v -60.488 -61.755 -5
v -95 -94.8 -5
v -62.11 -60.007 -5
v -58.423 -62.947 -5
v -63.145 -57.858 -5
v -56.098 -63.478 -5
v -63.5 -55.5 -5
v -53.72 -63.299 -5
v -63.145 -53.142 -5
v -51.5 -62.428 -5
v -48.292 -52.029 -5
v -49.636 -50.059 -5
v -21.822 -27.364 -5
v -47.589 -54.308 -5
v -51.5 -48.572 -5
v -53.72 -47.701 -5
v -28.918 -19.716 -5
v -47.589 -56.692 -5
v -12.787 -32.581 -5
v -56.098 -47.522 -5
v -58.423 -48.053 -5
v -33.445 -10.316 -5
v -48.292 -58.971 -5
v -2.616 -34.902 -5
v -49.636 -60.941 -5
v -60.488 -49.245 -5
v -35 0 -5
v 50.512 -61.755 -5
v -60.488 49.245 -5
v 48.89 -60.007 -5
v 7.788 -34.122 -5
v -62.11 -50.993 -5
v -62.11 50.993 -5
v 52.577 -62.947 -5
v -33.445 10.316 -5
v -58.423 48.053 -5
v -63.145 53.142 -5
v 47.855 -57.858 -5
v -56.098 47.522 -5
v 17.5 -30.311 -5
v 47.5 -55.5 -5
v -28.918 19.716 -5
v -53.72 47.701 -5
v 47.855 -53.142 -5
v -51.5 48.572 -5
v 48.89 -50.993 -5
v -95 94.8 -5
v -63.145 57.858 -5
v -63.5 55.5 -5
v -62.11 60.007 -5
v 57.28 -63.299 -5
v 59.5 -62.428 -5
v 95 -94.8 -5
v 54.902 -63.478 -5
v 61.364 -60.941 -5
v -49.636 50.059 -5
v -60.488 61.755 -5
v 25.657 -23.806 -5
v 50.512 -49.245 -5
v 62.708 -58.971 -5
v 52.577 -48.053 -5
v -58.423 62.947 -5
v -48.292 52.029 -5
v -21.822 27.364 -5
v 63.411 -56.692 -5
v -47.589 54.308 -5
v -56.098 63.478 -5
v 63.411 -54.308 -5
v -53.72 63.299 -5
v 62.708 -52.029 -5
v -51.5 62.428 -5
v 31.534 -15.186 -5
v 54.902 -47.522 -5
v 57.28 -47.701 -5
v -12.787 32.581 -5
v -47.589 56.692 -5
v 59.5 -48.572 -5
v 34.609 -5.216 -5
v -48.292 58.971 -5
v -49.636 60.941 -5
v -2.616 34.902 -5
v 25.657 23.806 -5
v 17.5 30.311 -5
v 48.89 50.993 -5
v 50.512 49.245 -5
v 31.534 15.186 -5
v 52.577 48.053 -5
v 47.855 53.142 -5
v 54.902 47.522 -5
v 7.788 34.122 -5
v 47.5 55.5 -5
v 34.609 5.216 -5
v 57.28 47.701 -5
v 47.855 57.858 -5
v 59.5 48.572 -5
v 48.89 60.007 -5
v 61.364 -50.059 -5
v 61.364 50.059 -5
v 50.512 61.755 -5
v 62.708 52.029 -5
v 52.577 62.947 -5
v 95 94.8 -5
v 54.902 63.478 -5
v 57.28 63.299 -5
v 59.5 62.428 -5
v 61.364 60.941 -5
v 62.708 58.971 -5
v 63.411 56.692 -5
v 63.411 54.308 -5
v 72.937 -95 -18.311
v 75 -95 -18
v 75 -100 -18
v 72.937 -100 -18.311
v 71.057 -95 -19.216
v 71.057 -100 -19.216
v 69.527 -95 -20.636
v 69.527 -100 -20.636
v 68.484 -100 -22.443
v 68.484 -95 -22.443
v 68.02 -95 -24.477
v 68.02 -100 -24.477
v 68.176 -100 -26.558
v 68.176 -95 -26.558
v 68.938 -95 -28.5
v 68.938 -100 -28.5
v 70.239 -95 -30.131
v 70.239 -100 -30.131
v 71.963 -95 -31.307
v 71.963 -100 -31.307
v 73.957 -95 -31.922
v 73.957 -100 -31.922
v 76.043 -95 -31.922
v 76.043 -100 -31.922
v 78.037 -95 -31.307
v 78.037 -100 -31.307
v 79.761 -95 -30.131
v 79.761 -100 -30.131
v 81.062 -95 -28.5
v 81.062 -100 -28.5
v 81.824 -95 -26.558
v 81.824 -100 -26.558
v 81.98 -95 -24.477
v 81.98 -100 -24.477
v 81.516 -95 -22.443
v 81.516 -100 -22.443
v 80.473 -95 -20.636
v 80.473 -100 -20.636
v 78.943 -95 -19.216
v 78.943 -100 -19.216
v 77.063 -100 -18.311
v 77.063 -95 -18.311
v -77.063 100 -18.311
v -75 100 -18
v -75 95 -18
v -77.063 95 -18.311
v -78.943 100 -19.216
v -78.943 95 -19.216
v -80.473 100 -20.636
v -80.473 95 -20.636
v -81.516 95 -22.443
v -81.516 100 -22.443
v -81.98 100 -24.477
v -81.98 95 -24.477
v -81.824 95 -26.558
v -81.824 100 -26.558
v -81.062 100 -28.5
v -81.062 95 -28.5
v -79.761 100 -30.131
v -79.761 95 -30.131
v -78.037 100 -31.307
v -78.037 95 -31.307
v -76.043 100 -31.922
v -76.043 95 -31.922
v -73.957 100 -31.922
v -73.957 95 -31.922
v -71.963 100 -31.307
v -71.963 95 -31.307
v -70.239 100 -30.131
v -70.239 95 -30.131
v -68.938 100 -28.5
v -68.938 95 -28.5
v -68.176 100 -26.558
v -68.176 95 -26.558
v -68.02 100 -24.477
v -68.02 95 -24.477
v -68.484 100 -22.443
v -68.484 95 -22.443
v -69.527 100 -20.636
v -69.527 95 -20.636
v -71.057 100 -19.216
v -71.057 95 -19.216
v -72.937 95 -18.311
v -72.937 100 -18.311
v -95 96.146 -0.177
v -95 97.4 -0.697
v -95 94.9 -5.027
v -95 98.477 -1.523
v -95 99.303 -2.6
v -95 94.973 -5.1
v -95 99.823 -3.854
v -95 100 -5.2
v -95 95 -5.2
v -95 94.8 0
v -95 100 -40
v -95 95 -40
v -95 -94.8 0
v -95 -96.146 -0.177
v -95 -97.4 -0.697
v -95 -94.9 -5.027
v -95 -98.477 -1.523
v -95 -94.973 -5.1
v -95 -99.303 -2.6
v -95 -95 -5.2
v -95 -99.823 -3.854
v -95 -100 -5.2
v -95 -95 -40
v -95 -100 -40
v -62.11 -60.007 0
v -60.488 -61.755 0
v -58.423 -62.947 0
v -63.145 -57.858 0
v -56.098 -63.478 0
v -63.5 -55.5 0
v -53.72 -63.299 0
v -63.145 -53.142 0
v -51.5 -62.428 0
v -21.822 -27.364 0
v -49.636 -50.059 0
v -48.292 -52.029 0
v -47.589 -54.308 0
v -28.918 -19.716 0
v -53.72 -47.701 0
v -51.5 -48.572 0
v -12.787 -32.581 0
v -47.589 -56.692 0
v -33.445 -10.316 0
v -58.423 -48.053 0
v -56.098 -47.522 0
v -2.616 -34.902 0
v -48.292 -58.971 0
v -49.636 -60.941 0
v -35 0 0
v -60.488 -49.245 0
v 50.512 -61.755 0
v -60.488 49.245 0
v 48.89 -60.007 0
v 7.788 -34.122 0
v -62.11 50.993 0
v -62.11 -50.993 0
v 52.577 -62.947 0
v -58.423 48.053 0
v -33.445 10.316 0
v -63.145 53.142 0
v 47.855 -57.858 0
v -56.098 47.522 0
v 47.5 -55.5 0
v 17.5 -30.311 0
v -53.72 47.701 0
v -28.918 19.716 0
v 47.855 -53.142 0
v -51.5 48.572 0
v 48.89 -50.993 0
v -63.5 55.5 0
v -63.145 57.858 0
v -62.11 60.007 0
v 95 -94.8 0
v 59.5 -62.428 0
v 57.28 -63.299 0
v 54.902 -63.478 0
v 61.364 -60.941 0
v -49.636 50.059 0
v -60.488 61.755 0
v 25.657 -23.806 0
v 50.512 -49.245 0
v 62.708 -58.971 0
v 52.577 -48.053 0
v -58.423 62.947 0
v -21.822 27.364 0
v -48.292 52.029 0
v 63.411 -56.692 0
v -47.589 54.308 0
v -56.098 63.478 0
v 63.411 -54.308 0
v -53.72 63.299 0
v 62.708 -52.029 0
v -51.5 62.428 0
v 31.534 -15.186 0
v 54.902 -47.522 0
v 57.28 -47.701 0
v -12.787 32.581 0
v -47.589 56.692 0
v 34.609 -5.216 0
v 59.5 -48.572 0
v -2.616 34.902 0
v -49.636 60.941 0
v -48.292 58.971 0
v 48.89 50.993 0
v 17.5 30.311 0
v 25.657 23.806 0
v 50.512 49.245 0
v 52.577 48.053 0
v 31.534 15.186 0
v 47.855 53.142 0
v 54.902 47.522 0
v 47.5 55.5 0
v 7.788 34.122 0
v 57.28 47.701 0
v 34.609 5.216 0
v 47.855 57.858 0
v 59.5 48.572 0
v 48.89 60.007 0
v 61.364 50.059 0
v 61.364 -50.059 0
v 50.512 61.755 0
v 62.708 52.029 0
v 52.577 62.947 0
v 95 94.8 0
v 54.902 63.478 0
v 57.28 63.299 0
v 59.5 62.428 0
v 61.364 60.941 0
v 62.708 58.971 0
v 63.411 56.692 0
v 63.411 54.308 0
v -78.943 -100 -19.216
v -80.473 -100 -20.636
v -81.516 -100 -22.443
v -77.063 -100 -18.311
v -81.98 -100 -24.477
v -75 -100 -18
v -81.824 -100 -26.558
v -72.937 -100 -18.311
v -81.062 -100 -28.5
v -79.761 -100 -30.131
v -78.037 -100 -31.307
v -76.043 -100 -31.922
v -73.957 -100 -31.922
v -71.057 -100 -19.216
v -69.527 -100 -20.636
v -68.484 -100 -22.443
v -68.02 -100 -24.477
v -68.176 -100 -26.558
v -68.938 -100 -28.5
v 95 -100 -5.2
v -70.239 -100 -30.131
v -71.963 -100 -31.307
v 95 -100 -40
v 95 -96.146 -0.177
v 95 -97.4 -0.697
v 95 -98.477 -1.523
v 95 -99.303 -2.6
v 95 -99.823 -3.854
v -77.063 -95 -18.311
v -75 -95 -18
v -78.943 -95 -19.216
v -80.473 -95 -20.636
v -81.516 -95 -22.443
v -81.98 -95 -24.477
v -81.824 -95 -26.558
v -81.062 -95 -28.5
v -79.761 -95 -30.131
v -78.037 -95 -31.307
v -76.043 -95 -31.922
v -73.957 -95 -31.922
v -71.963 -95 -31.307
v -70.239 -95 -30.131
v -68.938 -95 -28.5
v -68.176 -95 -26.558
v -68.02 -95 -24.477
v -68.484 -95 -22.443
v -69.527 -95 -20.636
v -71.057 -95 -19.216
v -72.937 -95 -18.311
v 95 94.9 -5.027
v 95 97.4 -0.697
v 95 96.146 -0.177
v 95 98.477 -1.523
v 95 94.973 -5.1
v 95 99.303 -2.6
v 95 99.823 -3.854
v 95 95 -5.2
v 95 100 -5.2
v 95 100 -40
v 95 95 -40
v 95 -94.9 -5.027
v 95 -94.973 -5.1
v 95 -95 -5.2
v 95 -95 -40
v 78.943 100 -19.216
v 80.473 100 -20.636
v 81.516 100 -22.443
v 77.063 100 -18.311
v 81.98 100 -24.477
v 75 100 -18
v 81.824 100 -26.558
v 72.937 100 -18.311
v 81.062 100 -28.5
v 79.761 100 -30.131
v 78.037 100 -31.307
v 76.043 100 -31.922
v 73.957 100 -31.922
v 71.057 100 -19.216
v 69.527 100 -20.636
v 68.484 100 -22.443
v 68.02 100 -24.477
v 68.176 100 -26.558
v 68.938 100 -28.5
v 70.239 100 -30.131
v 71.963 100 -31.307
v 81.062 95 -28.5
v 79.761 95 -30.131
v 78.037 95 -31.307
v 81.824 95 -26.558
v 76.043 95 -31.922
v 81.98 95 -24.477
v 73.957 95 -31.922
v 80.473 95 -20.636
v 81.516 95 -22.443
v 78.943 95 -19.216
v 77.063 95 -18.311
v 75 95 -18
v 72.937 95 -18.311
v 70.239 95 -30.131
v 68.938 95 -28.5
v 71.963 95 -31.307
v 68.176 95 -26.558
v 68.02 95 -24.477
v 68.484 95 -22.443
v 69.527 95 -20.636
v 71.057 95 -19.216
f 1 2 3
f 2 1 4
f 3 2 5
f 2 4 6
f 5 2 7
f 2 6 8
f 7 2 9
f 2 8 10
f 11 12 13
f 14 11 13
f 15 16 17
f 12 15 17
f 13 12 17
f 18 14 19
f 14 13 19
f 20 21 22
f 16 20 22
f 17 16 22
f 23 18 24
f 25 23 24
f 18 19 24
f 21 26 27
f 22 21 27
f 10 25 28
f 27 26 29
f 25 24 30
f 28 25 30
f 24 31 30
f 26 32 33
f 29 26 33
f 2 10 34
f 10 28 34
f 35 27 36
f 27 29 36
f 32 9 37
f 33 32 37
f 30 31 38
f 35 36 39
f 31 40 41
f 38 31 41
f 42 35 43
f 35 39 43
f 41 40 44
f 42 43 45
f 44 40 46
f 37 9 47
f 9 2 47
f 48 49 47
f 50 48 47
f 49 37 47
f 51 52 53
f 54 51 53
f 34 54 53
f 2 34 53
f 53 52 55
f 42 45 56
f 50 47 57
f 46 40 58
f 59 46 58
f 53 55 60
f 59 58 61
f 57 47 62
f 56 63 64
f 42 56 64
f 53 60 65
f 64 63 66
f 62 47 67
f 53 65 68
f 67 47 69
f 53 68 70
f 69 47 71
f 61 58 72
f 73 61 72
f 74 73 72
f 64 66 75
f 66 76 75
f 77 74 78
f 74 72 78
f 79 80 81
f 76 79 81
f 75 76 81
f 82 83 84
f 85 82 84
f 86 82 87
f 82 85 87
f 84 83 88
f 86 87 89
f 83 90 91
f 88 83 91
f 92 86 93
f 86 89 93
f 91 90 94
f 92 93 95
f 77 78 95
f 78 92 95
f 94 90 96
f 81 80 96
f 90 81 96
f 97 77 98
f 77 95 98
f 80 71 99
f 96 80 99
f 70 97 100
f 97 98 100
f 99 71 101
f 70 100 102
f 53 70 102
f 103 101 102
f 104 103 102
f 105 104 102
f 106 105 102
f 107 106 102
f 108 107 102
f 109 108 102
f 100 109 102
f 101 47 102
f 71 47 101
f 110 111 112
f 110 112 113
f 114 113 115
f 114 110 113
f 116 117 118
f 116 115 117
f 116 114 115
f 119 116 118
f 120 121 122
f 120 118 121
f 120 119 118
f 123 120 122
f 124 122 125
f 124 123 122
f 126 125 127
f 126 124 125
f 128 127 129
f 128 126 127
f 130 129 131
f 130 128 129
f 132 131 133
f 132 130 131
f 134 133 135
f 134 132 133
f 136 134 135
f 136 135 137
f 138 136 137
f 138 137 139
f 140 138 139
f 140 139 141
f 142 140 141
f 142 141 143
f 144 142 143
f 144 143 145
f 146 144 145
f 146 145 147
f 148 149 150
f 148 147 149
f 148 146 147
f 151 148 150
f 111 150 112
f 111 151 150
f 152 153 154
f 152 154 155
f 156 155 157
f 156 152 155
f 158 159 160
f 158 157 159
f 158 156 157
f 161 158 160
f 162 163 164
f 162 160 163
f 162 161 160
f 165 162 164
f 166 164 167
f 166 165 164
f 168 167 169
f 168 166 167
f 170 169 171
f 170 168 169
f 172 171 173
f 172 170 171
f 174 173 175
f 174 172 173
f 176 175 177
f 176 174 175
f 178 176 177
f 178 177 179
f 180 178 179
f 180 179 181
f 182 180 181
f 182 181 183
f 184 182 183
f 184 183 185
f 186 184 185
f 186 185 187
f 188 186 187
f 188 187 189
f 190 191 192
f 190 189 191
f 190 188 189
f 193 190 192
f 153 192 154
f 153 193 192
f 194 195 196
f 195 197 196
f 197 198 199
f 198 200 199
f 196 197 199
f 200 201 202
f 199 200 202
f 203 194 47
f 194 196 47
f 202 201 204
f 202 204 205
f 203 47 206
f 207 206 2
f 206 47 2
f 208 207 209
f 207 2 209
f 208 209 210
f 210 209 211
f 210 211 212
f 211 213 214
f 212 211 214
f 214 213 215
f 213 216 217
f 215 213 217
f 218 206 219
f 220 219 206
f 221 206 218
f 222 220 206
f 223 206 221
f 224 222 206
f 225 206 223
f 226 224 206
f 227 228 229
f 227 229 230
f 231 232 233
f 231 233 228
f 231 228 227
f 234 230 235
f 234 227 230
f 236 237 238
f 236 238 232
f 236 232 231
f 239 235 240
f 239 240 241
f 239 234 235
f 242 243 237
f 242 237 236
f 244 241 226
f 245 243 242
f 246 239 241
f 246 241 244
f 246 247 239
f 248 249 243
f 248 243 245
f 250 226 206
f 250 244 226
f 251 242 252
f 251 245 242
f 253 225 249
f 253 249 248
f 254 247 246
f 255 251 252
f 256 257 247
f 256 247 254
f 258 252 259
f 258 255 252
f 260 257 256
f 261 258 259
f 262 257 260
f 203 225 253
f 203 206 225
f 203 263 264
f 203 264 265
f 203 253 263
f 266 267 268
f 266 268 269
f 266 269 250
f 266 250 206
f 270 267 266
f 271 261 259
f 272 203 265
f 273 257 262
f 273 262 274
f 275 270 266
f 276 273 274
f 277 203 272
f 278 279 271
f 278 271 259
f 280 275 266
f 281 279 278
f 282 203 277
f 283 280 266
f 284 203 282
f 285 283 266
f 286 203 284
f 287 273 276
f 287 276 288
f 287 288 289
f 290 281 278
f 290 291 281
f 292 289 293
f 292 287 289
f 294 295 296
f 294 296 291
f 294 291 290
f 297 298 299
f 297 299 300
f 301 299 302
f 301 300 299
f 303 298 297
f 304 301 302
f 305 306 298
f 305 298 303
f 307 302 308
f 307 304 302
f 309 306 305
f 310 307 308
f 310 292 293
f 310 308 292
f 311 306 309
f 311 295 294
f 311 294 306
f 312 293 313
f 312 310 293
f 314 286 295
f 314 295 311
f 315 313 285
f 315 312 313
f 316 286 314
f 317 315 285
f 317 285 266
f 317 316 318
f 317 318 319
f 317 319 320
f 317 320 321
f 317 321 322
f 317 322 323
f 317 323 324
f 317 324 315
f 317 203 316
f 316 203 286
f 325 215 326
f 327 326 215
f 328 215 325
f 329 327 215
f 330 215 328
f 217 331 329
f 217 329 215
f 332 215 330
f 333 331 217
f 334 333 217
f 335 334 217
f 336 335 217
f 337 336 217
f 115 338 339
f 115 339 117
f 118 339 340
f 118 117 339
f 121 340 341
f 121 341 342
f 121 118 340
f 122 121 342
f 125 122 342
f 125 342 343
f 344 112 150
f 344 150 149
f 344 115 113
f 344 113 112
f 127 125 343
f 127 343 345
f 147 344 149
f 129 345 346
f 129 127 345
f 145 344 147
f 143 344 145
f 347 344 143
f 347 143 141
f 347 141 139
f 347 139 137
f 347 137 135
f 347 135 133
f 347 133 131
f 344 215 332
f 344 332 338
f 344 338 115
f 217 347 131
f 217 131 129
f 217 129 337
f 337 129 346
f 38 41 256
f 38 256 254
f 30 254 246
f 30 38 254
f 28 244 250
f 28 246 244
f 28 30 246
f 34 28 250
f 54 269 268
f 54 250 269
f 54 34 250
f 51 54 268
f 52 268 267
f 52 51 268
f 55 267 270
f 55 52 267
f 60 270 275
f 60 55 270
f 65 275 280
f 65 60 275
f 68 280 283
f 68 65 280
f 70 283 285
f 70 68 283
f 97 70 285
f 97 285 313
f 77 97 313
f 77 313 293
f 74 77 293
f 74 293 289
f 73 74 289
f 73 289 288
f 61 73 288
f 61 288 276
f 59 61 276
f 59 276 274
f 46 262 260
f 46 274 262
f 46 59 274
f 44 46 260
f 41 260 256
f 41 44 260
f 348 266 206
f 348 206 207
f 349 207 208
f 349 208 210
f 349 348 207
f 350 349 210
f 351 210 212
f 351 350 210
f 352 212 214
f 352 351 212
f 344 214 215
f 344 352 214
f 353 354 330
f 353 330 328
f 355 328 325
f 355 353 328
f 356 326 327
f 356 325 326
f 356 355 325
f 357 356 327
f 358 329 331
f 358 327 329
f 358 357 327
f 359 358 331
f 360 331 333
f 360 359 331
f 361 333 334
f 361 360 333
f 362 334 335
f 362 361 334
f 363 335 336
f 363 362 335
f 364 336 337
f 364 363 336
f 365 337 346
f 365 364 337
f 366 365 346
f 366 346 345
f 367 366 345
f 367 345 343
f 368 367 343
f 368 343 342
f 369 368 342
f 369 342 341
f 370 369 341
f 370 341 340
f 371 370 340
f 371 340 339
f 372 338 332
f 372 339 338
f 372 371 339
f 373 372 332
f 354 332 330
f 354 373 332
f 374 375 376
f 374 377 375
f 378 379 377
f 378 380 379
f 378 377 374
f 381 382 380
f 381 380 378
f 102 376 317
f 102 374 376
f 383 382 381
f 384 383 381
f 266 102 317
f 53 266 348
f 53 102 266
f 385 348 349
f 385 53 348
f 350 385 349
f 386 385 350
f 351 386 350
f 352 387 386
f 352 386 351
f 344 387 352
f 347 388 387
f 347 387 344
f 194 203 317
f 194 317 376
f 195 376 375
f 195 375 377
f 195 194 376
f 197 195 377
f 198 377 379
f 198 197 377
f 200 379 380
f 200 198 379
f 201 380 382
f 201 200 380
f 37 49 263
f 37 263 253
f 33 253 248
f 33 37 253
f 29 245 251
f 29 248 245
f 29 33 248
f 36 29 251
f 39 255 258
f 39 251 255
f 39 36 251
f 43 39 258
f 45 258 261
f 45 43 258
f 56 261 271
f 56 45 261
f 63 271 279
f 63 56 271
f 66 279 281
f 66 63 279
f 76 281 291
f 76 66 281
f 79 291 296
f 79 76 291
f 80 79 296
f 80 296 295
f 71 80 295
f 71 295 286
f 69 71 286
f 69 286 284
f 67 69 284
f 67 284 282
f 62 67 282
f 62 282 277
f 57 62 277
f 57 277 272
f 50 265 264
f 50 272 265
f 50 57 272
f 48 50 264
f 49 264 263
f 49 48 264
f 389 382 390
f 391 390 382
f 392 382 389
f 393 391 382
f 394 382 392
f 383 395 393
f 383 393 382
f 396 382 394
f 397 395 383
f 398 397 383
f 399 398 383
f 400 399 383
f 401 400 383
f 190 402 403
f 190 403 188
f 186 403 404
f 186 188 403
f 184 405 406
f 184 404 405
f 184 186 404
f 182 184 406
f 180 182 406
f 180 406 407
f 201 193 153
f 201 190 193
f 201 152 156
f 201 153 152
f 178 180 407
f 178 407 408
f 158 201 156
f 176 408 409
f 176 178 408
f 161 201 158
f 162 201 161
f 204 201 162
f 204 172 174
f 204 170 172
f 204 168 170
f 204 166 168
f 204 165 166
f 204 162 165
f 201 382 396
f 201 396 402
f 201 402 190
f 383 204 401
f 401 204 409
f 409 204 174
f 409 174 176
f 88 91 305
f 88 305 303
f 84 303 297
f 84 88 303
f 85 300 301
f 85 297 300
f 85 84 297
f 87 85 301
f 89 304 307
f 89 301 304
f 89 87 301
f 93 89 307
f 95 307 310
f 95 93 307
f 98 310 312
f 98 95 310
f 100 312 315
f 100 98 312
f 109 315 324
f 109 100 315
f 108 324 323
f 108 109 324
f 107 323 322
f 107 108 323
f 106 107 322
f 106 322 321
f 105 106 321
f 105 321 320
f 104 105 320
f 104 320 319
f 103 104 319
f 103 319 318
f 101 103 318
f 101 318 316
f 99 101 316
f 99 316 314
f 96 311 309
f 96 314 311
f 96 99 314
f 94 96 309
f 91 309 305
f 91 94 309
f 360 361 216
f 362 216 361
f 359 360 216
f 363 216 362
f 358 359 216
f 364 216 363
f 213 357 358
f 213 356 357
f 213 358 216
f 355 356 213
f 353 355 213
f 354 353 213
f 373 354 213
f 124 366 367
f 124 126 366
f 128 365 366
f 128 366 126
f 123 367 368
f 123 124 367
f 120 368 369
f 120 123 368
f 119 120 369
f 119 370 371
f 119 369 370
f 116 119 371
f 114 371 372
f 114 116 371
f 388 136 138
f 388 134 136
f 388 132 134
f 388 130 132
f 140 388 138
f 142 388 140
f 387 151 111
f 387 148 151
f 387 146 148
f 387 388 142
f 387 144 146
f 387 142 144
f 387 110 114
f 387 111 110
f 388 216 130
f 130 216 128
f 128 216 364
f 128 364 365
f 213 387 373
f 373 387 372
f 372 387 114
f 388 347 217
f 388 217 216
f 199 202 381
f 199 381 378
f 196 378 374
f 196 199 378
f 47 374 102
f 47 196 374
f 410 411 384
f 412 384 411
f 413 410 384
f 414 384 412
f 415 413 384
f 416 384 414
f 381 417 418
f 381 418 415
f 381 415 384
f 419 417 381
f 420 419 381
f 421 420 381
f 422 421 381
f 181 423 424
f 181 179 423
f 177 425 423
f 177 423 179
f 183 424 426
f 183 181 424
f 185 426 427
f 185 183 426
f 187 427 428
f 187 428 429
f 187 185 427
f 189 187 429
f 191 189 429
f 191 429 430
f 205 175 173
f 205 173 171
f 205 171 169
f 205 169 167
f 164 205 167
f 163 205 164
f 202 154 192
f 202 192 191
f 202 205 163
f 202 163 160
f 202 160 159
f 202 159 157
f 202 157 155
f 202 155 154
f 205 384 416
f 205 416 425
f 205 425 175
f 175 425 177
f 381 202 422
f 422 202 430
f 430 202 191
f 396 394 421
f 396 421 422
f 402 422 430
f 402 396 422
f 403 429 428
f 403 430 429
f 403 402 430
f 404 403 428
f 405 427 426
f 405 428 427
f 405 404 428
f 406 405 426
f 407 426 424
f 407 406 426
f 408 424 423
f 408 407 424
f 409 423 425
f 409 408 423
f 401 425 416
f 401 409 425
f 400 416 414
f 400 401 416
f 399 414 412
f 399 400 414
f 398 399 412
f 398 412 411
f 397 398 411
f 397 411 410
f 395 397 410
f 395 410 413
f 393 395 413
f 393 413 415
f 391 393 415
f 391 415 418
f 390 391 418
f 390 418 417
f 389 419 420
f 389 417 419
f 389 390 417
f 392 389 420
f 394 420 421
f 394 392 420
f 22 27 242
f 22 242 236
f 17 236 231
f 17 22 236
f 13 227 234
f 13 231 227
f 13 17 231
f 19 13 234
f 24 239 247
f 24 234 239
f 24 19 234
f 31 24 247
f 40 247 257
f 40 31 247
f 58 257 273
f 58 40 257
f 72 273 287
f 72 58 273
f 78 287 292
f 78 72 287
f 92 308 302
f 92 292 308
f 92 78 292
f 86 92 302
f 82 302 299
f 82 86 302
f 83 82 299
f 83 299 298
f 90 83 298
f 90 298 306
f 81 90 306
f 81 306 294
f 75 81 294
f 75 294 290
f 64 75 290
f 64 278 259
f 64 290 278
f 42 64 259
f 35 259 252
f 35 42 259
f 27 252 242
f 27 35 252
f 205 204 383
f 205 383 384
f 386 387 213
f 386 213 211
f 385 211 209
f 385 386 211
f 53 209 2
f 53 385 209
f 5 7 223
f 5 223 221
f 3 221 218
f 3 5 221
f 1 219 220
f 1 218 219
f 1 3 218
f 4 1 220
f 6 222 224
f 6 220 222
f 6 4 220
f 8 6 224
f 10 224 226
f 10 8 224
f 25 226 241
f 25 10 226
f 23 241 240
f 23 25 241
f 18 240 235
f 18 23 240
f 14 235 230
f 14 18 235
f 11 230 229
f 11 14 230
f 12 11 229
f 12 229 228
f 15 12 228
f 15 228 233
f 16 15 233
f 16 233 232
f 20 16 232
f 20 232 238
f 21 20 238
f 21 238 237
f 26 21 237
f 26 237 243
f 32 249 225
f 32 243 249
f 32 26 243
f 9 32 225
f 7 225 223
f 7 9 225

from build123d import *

# Parameters (mm, degrees)
SKETCH1_W                    = 190
SKETCH1_H                    = 200
BASE_FLANGE1_DEPTH           = 5
EDGE_FLANGE1_STRIP_W         = 20.4
EDGE_FLANGE1_STRIP_H         = 5
EDGE_FLANGE1_STRIP_CUT_DEPTH = 190
EDGE_FLANGE1_DEPTH           = 190
EDGE_FLANGE2_STRIP_W         = 20.4
EDGE_FLANGE2_STRIP_H         = 5
EDGE_FLANGE2_STRIP_CUT_DEPTH = 190
EDGE_FLANGE2_DEPTH           = 190
CUT_EXTRUDE1_DEPTH           = 144.614066163
CUT_EXTRUDE1_DEPTH_BACK      = 144.614066163
SKETCH12_R                   = 35
CUT_EXTRUDE2_DEPTH           = 144.614066163
CUT_EXTRUDE2_DEPTH_BACK      = 144.614066163
SKETCH13_R                   = 8
CUT_EXTRUDE3_DEPTH           = 226
CUT_EXTRUDE3_DEPTH_BACK      = 226
SKETCH14_R                   = 7


# Sheet-metal steps are written as plain solids
with BuildPart() as part:
    # Sketch1 → Base-Flange1 (new body)
    with BuildSketch(Plane.XY):
        Rectangle(SKETCH1_W, SKETCH1_H)
    extrude(amount=-BASE_FLANGE1_DEPTH)

    # Edge-Flange1 strip (across the edge) → Edge-Flange1 strip cut (cut)
    with BuildSketch(Plane(origin=(-95, 100, -5), x_dir=(0, -1, 0), z_dir=(1, 0, 0))):
        with Locations((-5, -2.5)):
            Rectangle(EDGE_FLANGE1_STRIP_W, EDGE_FLANGE1_STRIP_H)
    extrude(amount=EDGE_FLANGE1_STRIP_CUT_DEPTH, mode=Mode.SUBTRACT)

    # Edge-Flange1 section (across the edge) → Edge-Flange1 (add)
    with BuildSketch(Plane(origin=(-95, 100, -5), x_dir=(0, -1, 0), z_dir=(1, 0, 0))):
        with BuildLine():
            Line((0, 0.2), (0, 35))
            Line((0, 35), (5, 35))
            Line((5, 35), (5, 0.2))
            ThreePointArc((5, 0.2), (5.058578644, 0.058578644), (5.2, 0))
            Line((5.2, 0), (5.2, -5))
            ThreePointArc((5.2, -5), (1.523044738, -3.476955262), (0, 0.2))
        make_face()
    extrude(amount=EDGE_FLANGE1_DEPTH)

    # Edge-Flange2 strip (across the edge) → Edge-Flange2 strip cut (cut)
    with BuildSketch(Plane(origin=(95, -100, -5), x_dir=(0, 1, 0), z_dir=(-1, 0, 0))):
        with Locations((-5, -2.5)):
            Rectangle(EDGE_FLANGE2_STRIP_W, EDGE_FLANGE2_STRIP_H)
    extrude(amount=EDGE_FLANGE2_STRIP_CUT_DEPTH, mode=Mode.SUBTRACT)

    # Edge-Flange2 section (across the edge) → Edge-Flange2 (add)
    with BuildSketch(Plane(origin=(95, -100, -5), x_dir=(0, 1, 0), z_dir=(-1, 0, 0))):
        with BuildLine():
            Line((0, 0.2), (0, 35))
            Line((0, 35), (5, 35))
            Line((5, 35), (5, 0.2))
            ThreePointArc((5, 0.2), (5.058578644, 0.058578644), (5.2, 0))
            Line((5.2, 0), (5.2, -5))
            ThreePointArc((5.2, -5), (1.523044738, -3.476955262), (0, 0.2))
        make_face()
    extrude(amount=EDGE_FLANGE2_DEPTH)

    # Sketch12 → Cut-Extrude1 (cut, two sides: drawn at the far end of the back side and taken through both)
    with BuildSketch(Plane.XY.offset(-CUT_EXTRUDE1_DEPTH_BACK)):
        with Locations(Location((0, 0, 0), (0, 0, 180))):
            Circle(SKETCH12_R)
    extrude(amount=CUT_EXTRUDE1_DEPTH + CUT_EXTRUDE1_DEPTH_BACK, mode=Mode.SUBTRACT)

    # Sketch13 → Cut-Extrude2 (cut, two sides: drawn at the far end of the back side and taken through both)
    with BuildSketch(Plane.XY.offset(-CUT_EXTRUDE2_DEPTH_BACK)):
        with Locations(Location((55.5, 55.5, 0), (0, 0, 180))):
            Circle(SKETCH13_R)
        with Locations(Location((-55.5, 55.5, 0), (0, 0, 180))):
            Circle(SKETCH13_R)
        with Locations(Location((-55.5, -55.5, 0), (0, 0, 180))):
            Circle(SKETCH13_R)
        with Locations(Location((55.5, -55.5, 0), (0, 0, 180))):
            Circle(SKETCH13_R)
    extrude(amount=CUT_EXTRUDE2_DEPTH + CUT_EXTRUDE2_DEPTH_BACK, mode=Mode.SUBTRACT)

    # Sketch14 → Cut-Extrude3 (cut, two sides: drawn at the far end of the back side and taken through both)
    with BuildSketch(Plane(origin=(0, -100, 0), x_dir=(-1, 0, 0), z_dir=(0, -1, 0)).offset(-CUT_EXTRUDE3_DEPTH_BACK)):
        with Locations(Location((75, 25, 0), (0, 0, 270))):
            Circle(SKETCH14_R)
        with Locations(Location((-75, 25, 0), (0, 0, 270))):
            Circle(SKETCH14_R)
    extrude(amount=CUT_EXTRUDE3_DEPTH + CUT_EXTRUDE3_DEPTH_BACK, mode=Mode.SUBTRACT)


solid = part.part
